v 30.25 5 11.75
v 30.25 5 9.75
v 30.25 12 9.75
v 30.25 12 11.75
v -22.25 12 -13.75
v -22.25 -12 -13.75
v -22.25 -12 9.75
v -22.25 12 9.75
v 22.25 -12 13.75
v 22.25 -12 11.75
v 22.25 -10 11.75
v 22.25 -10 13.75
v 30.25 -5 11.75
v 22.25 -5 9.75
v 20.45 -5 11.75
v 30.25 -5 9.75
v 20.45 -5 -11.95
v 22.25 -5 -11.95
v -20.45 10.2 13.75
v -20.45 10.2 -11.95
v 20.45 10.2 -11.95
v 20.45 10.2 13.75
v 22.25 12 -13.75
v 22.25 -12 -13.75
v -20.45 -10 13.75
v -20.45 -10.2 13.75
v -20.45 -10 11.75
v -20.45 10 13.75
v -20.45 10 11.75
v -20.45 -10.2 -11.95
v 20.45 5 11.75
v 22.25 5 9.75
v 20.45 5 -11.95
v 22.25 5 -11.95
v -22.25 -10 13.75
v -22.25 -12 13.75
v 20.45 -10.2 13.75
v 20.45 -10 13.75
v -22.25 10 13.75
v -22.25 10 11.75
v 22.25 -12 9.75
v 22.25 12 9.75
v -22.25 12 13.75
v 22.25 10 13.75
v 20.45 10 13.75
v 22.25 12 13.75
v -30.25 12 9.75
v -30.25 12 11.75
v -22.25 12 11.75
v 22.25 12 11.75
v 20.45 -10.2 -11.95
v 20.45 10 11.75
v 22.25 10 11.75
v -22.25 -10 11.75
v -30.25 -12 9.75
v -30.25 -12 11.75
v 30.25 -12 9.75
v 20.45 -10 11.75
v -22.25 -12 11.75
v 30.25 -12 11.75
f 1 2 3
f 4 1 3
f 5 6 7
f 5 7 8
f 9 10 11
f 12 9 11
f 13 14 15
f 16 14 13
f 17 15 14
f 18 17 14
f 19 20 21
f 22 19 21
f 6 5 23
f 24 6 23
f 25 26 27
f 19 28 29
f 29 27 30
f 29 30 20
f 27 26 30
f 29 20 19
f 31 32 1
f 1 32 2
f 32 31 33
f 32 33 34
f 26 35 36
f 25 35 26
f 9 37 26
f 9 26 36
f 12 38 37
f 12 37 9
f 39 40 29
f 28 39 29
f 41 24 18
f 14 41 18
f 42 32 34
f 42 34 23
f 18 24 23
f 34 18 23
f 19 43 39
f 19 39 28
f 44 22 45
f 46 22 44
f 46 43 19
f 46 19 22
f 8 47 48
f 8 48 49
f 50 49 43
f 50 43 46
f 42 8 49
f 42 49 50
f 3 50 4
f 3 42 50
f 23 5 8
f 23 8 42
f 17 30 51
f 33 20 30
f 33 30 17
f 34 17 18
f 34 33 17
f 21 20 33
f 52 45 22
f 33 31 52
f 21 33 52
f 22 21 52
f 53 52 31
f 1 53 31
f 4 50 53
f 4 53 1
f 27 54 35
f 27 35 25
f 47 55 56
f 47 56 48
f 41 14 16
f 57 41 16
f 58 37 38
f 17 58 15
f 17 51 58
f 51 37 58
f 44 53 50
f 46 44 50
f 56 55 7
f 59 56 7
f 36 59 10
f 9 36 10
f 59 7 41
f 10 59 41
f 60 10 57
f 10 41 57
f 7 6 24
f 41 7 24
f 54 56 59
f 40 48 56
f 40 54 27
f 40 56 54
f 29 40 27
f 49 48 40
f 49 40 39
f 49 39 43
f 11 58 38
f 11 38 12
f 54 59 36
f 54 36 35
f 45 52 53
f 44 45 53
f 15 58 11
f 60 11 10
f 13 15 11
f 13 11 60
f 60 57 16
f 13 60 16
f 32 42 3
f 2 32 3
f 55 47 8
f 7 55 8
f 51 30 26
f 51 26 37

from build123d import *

# Parameters (mm, degrees)
CUBE003_W     = 60.5
CUBE003_H     = 20
CUBE003_DEPTH = 3
CUBE004_W     = 30
CUBE004_H     = 10
CUBE004_DEPTH = 47.5
CUBE002_W     = 40.9
CUBE002_H     = 20.4
CUBE002_DEPTH = 27.9
CUBE001_W     = 60.5
CUBE001_H     = 24
CUBE001_DEPTH = 2
CUBE_W        = 44.5
CUBE_H        = 24
CUBE_DEPTH    = 27.5


with BuildPart() as cube003:
    # cube003 → cube003 (new body)
    with BuildSketch(Plane(origin=(-30.25, -10, 11.75), x_dir=(1, 0, 0), z_dir=(0, 0, 1))):
        with Locations((30.25, 10)):
            Rectangle(CUBE003_W, CUBE003_H)
    extrude(amount=CUBE003_DEPTH)


with BuildPart() as cube004:
    # cube004 → cube004 (new body)
    with BuildSketch(Plane(origin=(5, -5, -11.95), x_dir=(1, 0, 0), z_dir=(0, 0, 1))):
        with Locations((15, 5)):
            Rectangle(CUBE004_W, CUBE004_H)
    extrude(amount=CUBE004_DEPTH)


with BuildPart() as union001:
    # cube002 → cube002 (new body)
    with BuildSketch(Plane(origin=(-20.45, -10.2, -11.95), x_dir=(1, 0, 0), z_dir=(0, 0, 1))):
        with Locations((20.45, 10.2)):
            Rectangle(CUBE002_W, CUBE002_H)
    extrude(amount=CUBE002_DEPTH)

    # union001: union cube003, cube004
    add(cube003.part)
    add(cube004.part)


with BuildPart() as cube001:
    # cube001 → cube001 (new body)
    with BuildSketch(Plane(origin=(-30.25, -12, 9.75), x_dir=(1, 0, 0), z_dir=(0, 0, 1))):
        with Locations((30.25, 12)):
            Rectangle(CUBE001_W, CUBE001_H)
    extrude(amount=CUBE001_DEPTH)


with BuildPart() as difference:
    # cube → cube (new body)
    with BuildSketch(Plane(origin=(-22.25, -12, -13.75), x_dir=(1, 0, 0), z_dir=(0, 0, 1))):
        with Locations((22.25, 12)):
            Rectangle(CUBE_W, CUBE_H)
    extrude(amount=CUBE_DEPTH)

    # union: union cube001
    add(cube001.part)

    # difference: cut union001
    add(union001.part, mode=Mode.SUBTRACT)


solid = difference.part
